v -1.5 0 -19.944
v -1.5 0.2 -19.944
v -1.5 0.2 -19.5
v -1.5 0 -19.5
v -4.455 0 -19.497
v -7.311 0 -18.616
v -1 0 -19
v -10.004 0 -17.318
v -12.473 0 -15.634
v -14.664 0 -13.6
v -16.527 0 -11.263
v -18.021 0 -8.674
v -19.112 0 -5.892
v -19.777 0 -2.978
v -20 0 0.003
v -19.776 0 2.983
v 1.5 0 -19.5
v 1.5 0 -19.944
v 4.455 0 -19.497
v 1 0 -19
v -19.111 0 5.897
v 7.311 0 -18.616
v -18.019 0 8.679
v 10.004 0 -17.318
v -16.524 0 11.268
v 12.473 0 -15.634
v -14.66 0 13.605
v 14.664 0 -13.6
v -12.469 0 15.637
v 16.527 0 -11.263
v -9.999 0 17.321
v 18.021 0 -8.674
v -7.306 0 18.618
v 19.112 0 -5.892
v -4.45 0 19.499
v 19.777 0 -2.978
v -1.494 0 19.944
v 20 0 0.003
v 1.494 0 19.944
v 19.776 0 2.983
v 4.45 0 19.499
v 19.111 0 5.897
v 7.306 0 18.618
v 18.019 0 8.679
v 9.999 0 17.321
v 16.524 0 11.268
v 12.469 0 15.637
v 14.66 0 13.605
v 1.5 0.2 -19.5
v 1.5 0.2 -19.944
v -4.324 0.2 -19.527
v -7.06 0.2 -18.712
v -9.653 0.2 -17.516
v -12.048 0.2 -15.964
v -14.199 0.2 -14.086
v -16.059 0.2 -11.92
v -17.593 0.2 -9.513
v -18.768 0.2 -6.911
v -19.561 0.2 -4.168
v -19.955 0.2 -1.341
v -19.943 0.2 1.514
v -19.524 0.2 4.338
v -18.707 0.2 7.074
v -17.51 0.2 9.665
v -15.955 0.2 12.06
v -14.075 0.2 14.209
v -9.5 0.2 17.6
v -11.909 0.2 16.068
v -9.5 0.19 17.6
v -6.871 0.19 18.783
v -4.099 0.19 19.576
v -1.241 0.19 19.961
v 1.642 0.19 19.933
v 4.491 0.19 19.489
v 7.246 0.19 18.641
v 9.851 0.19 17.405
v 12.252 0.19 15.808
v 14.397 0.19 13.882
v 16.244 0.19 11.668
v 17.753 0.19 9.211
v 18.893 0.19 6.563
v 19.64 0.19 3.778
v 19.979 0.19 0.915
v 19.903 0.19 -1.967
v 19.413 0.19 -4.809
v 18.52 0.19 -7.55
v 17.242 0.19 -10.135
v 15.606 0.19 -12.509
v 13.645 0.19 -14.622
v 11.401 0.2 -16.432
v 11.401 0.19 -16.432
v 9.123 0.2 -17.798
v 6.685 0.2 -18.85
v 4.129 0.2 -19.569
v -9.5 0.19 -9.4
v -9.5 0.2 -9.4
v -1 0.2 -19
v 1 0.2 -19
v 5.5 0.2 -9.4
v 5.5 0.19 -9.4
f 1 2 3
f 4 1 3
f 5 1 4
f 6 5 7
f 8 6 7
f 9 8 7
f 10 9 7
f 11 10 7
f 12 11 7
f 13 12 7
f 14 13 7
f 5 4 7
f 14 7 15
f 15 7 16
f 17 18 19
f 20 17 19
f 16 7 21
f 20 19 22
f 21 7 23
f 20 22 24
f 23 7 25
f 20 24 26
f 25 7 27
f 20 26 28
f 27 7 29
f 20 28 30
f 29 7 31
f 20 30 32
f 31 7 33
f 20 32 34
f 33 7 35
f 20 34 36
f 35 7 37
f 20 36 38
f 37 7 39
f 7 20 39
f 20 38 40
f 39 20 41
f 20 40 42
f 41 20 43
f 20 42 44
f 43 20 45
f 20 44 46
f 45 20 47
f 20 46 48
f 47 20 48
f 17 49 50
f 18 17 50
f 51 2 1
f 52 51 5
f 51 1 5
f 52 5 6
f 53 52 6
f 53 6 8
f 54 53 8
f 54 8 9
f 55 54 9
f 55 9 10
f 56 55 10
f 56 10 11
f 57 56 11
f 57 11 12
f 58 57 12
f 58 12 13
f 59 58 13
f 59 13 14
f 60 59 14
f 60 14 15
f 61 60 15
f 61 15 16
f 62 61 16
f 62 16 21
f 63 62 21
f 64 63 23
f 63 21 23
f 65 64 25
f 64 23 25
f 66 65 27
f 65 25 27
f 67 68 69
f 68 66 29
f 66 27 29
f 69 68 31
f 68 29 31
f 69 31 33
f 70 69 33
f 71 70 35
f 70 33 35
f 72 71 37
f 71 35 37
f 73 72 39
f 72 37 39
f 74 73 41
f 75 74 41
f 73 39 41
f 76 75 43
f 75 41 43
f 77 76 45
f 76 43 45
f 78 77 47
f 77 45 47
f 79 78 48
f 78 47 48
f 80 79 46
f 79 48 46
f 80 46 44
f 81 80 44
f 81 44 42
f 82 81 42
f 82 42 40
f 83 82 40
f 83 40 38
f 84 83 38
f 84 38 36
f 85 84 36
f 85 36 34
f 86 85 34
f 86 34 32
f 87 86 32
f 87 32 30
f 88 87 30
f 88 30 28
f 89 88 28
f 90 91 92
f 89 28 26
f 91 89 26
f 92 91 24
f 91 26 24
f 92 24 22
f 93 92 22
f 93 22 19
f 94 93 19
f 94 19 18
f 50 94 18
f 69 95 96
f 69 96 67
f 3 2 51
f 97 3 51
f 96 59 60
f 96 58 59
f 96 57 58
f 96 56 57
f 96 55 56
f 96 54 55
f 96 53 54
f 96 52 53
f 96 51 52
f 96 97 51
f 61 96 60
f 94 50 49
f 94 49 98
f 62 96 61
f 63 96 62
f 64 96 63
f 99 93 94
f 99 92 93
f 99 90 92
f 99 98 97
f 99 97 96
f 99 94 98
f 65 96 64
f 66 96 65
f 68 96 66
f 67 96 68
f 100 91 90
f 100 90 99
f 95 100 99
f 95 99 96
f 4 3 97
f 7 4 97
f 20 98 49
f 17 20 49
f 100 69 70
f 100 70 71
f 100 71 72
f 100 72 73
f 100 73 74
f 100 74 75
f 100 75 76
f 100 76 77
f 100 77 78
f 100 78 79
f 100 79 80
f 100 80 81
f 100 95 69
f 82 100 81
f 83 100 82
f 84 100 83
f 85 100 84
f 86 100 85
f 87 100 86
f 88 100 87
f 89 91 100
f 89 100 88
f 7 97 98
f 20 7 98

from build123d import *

# Parameters (mm, degrees)
SKETCH1_R           = 20
BOSS_EXTRUDE1_DEPTH = 0.2
CUT_EXTRUDE1_DEPTH  = 29.284978345
CUT_EXTRUDE2_START  = -0.01
CUT_EXTRUDE2_DEPTH  = 0.01


with BuildPart() as part:
    # Sketch1 → Boss-Extrude1 (new body)
    with BuildSketch(Plane(origin=(0, 0, 0), x_dir=(1, 0, 0), z_dir=(0, 1, 0))):
        with Locations(Location((0, 0, 0), (0, 0, 270))):
            Circle(SKETCH1_R)
    extrude(amount=BOSS_EXTRUDE1_DEPTH)

    # Sketch2 → Cut-Extrude1 (cut, through all)
    with BuildSketch(Plane(origin=(0, 0.2, 0), x_dir=(1, 0, 0), z_dir=(0, 1, 0))):
        with BuildLine():
            Line((1.5, 19.5), (1.5, 19.943670675))
            ThreePointArc((1.5, 19.943670675), (0, 20), (-1.5, 19.943670675))
            Line((-1.5, 19.943670675), (-1.5, 19.5))
            Line((-1.5, 19.5), (-1, 19))
            Line((-1, 19), (1, 19))
            Line((1, 19), (1.5, 19.5))
        make_face()
    extrude(amount=-CUT_EXTRUDE1_DEPTH, mode=Mode.SUBTRACT)

    # Sketch3 → Cut-Extrude2 (cut)
    with BuildSketch(Plane(origin=(0, 0.2, 0), x_dir=(1, 0, 0), z_dir=(0, 1, 0)).offset(CUT_EXTRUDE2_START)):
        with BuildLine():
            ThreePointArc((-9.5, -17.599715907), (17.042589511, -10.466620408), (11.400670136, 16.432428927))
            Line((11.400670136, 16.432428927), (5.5, 9.400284093))
            Line((5.5, 9.400284093), (-9.5, 9.400284093))
            Line((-9.5, 9.400284093), (-9.5, -17.599715907))
        make_face()
    extrude(amount=CUT_EXTRUDE2_DEPTH, mode=Mode.SUBTRACT)


solid = part.part
